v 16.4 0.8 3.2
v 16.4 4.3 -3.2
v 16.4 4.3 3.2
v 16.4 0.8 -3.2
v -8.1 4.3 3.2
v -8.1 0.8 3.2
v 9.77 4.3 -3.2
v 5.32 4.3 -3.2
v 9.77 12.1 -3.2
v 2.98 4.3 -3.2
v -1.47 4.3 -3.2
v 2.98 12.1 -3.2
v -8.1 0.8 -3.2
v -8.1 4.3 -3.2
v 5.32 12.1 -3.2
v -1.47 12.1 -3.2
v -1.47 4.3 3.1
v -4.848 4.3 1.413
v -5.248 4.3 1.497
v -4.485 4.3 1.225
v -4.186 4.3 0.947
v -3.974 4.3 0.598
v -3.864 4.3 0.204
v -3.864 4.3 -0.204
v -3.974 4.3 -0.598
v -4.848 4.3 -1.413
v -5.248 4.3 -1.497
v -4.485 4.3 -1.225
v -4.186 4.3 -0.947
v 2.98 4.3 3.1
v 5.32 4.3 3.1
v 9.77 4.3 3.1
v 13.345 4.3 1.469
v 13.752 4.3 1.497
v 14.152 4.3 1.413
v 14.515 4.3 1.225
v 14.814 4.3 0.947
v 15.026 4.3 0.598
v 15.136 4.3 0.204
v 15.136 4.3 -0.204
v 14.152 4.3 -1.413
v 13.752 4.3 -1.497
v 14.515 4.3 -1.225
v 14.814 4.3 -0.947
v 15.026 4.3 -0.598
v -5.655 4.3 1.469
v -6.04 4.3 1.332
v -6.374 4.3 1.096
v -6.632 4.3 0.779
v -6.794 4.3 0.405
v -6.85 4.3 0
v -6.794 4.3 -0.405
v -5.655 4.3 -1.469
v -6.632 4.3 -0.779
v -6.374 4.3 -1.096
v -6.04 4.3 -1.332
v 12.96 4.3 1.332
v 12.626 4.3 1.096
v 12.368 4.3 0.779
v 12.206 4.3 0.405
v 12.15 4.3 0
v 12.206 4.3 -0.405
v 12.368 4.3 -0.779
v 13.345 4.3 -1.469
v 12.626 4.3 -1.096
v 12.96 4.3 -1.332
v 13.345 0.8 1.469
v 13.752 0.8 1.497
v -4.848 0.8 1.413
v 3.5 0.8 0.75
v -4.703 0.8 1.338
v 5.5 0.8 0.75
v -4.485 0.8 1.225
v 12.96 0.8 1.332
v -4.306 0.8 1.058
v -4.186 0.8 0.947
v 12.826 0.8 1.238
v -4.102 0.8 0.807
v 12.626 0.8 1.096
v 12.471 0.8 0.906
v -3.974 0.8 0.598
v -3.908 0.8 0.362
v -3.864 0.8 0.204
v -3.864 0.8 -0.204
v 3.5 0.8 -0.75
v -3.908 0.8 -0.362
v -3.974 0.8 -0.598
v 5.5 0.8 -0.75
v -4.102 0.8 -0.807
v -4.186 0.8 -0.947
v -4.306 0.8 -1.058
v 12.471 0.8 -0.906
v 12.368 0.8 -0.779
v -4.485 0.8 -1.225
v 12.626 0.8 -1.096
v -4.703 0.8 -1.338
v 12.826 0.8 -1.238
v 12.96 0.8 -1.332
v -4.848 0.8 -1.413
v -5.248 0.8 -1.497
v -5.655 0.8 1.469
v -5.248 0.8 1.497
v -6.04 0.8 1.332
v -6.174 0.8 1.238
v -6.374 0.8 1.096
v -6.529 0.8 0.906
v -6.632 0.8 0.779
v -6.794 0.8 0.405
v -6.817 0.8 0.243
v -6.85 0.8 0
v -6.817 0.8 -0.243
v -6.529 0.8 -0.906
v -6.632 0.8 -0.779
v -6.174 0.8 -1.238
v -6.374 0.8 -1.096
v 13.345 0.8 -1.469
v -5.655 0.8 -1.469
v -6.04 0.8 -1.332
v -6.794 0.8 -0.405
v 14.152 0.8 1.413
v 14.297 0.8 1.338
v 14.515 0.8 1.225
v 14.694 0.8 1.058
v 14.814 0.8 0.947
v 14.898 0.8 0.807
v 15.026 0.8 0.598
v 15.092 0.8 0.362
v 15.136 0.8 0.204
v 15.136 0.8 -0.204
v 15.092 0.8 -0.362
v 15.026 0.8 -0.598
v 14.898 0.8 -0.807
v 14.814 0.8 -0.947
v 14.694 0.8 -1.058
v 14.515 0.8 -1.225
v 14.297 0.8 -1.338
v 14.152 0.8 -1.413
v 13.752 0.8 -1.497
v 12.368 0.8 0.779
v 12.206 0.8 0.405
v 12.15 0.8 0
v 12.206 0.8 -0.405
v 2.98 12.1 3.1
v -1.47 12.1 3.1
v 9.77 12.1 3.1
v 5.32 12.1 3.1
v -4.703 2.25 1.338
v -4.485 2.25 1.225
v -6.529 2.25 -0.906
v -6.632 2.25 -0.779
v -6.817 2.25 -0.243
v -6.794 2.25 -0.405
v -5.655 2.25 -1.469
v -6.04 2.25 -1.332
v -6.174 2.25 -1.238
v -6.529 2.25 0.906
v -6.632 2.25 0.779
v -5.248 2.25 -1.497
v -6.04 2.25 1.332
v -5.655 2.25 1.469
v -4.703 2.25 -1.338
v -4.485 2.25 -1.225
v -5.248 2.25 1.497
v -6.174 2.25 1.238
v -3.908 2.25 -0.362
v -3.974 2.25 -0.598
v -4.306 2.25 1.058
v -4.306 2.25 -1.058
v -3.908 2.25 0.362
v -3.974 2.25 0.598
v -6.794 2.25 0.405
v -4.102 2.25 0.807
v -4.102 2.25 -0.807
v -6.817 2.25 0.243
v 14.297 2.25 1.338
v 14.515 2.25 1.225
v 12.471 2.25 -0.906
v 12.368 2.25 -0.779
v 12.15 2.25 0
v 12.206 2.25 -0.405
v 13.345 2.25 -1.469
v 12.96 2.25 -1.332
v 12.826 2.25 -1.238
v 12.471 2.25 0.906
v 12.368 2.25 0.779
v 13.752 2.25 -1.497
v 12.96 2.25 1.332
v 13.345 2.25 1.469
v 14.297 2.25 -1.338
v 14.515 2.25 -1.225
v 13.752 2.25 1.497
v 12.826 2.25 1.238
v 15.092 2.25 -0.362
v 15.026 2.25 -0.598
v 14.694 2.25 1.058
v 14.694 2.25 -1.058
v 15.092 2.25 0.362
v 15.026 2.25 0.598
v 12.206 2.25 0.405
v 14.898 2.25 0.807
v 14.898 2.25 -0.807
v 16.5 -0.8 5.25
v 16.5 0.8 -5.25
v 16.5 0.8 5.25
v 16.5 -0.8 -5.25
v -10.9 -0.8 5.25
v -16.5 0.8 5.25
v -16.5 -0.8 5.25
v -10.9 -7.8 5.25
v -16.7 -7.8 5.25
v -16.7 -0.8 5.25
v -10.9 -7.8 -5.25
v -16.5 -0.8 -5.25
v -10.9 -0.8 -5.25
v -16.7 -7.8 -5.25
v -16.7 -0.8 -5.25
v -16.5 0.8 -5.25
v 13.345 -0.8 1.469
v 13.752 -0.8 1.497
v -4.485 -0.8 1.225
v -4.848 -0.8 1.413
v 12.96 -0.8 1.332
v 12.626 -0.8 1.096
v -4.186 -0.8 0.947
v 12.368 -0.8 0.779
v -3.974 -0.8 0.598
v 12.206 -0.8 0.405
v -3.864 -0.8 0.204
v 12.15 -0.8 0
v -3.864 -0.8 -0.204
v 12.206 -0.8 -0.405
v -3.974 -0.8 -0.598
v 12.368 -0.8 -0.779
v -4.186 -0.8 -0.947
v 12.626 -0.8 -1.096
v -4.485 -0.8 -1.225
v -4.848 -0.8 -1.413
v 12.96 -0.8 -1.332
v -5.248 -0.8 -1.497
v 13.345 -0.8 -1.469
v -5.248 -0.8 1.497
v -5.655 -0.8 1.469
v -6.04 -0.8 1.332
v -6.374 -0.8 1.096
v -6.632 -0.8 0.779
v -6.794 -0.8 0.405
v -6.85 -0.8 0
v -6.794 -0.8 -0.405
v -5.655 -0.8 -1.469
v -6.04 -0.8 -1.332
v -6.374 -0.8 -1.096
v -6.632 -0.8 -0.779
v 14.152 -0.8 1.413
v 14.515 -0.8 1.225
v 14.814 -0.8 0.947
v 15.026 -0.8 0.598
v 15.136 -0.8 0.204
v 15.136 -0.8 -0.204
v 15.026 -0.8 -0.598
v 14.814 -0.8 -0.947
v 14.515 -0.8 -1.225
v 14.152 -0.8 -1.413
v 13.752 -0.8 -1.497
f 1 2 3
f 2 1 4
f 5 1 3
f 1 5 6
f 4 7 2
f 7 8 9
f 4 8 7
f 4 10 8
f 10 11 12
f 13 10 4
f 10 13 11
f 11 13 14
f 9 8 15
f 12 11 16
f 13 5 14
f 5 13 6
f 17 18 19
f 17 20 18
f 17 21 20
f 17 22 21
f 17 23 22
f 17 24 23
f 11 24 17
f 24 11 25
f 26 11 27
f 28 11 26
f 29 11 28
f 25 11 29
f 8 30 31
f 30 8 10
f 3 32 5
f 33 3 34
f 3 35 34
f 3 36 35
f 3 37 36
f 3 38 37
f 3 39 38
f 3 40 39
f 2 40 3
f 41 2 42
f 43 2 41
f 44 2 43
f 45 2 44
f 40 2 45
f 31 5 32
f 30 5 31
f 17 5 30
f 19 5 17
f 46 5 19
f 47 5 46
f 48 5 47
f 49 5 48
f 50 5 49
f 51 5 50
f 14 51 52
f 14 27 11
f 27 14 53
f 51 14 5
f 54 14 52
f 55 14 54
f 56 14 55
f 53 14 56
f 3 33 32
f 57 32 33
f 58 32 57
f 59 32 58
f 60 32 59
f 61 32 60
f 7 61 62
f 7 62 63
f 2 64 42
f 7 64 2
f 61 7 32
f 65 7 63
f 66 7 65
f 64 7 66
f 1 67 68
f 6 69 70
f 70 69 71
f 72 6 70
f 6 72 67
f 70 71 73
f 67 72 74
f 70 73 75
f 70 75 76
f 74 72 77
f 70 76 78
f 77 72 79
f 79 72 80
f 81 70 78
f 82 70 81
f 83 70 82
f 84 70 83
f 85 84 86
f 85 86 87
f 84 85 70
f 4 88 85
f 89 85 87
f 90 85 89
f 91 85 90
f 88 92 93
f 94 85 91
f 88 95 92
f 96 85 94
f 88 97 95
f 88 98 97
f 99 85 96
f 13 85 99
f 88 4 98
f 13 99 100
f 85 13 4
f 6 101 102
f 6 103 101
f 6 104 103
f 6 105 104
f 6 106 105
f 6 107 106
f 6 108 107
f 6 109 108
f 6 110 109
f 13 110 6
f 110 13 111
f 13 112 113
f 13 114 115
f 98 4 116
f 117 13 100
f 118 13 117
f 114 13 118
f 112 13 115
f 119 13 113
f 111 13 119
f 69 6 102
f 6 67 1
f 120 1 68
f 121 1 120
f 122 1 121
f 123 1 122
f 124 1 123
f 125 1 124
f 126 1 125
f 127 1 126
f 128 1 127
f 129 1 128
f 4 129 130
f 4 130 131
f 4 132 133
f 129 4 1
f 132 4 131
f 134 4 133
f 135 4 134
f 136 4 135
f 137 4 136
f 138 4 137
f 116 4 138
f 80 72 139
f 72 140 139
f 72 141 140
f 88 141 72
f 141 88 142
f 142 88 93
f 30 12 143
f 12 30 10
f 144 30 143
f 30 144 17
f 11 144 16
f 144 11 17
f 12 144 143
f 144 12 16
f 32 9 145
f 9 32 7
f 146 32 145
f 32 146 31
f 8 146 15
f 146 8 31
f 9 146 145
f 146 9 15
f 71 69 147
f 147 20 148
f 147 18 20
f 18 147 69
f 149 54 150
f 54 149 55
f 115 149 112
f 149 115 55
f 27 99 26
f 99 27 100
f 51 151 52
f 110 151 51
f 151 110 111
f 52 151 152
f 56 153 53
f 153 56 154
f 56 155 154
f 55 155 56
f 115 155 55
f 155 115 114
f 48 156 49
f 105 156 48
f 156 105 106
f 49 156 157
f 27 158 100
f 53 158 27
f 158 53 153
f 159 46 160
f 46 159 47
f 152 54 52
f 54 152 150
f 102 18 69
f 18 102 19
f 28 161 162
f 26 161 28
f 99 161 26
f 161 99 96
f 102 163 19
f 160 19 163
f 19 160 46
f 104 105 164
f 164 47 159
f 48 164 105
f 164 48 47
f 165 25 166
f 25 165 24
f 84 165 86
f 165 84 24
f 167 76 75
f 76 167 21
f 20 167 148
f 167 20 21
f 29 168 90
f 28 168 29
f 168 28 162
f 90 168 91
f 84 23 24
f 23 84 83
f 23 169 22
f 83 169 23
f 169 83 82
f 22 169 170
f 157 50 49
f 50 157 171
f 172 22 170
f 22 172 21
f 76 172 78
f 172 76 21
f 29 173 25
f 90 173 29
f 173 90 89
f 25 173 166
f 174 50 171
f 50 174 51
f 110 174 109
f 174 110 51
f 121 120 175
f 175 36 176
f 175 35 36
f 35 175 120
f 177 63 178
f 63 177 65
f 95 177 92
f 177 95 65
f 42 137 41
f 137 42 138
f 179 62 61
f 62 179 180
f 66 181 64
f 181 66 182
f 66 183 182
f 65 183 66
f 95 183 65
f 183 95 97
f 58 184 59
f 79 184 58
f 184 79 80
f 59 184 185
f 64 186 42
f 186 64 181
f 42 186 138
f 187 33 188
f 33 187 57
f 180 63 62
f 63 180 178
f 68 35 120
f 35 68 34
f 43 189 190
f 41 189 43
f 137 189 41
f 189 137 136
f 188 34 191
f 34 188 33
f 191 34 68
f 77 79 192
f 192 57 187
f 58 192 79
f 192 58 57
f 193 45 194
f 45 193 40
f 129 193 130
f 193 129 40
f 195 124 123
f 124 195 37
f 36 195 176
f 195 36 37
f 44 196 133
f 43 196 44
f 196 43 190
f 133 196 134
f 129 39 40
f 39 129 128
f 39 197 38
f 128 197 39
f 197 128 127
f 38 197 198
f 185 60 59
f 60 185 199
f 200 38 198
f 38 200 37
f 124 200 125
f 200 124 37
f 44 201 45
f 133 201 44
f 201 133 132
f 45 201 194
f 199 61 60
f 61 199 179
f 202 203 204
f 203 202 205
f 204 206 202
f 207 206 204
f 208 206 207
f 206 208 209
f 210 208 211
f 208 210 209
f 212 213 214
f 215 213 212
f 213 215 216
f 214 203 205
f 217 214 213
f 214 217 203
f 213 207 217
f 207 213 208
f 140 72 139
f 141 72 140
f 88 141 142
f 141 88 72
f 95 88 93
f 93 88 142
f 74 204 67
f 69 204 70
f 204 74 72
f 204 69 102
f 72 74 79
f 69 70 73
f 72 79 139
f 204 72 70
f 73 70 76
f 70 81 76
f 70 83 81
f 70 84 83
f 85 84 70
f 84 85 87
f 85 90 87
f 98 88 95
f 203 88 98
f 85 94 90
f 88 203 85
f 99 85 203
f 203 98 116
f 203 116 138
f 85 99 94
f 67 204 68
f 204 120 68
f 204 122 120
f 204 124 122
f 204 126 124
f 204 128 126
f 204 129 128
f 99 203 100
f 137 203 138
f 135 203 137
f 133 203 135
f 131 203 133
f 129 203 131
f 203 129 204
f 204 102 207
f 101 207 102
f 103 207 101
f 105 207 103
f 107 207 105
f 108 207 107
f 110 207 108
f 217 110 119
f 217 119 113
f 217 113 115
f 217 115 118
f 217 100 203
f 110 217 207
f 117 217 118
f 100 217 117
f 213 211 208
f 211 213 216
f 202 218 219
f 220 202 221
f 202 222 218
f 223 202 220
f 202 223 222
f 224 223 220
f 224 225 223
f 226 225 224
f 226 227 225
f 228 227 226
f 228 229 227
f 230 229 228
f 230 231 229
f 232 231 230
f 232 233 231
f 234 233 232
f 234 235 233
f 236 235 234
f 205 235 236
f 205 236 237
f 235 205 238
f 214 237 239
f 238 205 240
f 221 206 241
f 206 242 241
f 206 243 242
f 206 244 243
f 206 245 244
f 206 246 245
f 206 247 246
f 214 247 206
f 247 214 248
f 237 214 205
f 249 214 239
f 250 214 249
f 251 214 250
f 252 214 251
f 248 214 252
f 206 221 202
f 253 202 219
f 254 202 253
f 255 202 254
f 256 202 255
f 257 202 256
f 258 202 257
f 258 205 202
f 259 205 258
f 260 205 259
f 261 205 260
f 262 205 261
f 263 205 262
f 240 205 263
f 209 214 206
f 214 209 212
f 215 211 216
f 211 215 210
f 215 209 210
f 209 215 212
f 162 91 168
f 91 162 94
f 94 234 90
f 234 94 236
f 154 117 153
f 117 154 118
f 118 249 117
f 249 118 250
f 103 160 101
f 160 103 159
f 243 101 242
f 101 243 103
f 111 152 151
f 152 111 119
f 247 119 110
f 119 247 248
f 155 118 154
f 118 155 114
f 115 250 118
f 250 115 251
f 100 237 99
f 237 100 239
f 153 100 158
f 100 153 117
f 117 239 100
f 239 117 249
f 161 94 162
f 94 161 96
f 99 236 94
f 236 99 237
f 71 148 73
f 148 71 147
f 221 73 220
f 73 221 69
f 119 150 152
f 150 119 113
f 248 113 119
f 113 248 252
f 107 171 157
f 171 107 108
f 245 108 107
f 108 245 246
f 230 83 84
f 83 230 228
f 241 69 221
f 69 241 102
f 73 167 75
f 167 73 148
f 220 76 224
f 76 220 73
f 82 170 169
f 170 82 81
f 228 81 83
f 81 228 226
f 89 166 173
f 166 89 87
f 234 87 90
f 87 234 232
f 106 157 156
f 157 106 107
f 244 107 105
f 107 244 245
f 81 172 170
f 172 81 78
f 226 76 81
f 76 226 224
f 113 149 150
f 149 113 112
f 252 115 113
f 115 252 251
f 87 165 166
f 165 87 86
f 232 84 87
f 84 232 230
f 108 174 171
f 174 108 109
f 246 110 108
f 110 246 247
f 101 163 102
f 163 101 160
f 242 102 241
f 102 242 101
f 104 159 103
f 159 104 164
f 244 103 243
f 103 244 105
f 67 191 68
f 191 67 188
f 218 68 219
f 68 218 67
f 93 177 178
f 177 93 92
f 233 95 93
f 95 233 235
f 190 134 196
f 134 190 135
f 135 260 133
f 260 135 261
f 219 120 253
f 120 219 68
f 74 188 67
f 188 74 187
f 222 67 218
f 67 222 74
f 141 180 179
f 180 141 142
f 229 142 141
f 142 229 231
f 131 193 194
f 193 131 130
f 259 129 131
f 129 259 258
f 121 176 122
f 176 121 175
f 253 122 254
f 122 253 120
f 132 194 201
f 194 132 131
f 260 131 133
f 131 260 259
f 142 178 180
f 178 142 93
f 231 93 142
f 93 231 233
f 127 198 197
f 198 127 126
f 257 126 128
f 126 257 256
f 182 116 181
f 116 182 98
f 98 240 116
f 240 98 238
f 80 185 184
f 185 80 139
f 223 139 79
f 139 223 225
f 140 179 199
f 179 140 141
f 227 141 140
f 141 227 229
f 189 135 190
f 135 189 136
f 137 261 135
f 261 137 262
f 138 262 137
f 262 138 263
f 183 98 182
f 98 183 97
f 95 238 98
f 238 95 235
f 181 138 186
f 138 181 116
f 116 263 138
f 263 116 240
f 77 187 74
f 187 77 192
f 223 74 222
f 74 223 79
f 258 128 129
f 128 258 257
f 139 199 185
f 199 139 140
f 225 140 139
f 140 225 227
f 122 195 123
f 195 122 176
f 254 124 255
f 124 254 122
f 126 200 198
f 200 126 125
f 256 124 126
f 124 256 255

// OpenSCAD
difference() {
  union() {
    // base
    color("red")
    // volume
    cube(size=[33.0, 1.6, 10.5], center=true);
    // switch
    color("grey")
    translate(v=[4.15, 2.55, 0.0])
    difference() {
      union() {
        // base
        // volume
        cube(size=[24.5, 3.5, 6.4], center=true);
        // left_side
        // volume
        translate(v=[-3.395, 3.9, -0.05])
        cube(size=[4.45, 11.3, 6.3], center=true);
        // right_side
        // volume
        translate(v=[3.395, 3.9, -0.05])
        cube(size=[4.45, 11.3, 6.3], center=true);
      }
      // left_hole
      translate(v=[-9.5, 0.0, 0.0])
      rotate(a=[270, 0, 180])
      cylinder(h=4.5, d=3, $fn=23, center=true);
      // right_hole
      translate(v=[9.5, 0.0, 0.0])
      rotate(a=[270, 0, 180])
      cylinder(h=4.5, d=3, $fn=23, center=true);
    }
    // led
    color("blue")
    // volume
    translate(v=[4.5, 1.15, 0.0])
    cube(size=[2.0, 0.7, 1.5], center=true);
    // connector
    color("white")
    // volume
    translate(v=[-13.8, -4.3, 0.0])
    cube(size=[5.8, 7.0, 10.5], center=true);
  }
  // left_hole
  translate(v=[-5.35, 0.0, 0.0])
  rotate(a=[270, 0, 180])
  cylinder(h=4.5, d=3, $fn=23, center=true);
  // right_hole
  translate(v=[13.65, 0.0, 0.0])
  rotate(a=[270, 0, 180])
  cylinder(h=4.5, d=3, $fn=23, center=true);
}
